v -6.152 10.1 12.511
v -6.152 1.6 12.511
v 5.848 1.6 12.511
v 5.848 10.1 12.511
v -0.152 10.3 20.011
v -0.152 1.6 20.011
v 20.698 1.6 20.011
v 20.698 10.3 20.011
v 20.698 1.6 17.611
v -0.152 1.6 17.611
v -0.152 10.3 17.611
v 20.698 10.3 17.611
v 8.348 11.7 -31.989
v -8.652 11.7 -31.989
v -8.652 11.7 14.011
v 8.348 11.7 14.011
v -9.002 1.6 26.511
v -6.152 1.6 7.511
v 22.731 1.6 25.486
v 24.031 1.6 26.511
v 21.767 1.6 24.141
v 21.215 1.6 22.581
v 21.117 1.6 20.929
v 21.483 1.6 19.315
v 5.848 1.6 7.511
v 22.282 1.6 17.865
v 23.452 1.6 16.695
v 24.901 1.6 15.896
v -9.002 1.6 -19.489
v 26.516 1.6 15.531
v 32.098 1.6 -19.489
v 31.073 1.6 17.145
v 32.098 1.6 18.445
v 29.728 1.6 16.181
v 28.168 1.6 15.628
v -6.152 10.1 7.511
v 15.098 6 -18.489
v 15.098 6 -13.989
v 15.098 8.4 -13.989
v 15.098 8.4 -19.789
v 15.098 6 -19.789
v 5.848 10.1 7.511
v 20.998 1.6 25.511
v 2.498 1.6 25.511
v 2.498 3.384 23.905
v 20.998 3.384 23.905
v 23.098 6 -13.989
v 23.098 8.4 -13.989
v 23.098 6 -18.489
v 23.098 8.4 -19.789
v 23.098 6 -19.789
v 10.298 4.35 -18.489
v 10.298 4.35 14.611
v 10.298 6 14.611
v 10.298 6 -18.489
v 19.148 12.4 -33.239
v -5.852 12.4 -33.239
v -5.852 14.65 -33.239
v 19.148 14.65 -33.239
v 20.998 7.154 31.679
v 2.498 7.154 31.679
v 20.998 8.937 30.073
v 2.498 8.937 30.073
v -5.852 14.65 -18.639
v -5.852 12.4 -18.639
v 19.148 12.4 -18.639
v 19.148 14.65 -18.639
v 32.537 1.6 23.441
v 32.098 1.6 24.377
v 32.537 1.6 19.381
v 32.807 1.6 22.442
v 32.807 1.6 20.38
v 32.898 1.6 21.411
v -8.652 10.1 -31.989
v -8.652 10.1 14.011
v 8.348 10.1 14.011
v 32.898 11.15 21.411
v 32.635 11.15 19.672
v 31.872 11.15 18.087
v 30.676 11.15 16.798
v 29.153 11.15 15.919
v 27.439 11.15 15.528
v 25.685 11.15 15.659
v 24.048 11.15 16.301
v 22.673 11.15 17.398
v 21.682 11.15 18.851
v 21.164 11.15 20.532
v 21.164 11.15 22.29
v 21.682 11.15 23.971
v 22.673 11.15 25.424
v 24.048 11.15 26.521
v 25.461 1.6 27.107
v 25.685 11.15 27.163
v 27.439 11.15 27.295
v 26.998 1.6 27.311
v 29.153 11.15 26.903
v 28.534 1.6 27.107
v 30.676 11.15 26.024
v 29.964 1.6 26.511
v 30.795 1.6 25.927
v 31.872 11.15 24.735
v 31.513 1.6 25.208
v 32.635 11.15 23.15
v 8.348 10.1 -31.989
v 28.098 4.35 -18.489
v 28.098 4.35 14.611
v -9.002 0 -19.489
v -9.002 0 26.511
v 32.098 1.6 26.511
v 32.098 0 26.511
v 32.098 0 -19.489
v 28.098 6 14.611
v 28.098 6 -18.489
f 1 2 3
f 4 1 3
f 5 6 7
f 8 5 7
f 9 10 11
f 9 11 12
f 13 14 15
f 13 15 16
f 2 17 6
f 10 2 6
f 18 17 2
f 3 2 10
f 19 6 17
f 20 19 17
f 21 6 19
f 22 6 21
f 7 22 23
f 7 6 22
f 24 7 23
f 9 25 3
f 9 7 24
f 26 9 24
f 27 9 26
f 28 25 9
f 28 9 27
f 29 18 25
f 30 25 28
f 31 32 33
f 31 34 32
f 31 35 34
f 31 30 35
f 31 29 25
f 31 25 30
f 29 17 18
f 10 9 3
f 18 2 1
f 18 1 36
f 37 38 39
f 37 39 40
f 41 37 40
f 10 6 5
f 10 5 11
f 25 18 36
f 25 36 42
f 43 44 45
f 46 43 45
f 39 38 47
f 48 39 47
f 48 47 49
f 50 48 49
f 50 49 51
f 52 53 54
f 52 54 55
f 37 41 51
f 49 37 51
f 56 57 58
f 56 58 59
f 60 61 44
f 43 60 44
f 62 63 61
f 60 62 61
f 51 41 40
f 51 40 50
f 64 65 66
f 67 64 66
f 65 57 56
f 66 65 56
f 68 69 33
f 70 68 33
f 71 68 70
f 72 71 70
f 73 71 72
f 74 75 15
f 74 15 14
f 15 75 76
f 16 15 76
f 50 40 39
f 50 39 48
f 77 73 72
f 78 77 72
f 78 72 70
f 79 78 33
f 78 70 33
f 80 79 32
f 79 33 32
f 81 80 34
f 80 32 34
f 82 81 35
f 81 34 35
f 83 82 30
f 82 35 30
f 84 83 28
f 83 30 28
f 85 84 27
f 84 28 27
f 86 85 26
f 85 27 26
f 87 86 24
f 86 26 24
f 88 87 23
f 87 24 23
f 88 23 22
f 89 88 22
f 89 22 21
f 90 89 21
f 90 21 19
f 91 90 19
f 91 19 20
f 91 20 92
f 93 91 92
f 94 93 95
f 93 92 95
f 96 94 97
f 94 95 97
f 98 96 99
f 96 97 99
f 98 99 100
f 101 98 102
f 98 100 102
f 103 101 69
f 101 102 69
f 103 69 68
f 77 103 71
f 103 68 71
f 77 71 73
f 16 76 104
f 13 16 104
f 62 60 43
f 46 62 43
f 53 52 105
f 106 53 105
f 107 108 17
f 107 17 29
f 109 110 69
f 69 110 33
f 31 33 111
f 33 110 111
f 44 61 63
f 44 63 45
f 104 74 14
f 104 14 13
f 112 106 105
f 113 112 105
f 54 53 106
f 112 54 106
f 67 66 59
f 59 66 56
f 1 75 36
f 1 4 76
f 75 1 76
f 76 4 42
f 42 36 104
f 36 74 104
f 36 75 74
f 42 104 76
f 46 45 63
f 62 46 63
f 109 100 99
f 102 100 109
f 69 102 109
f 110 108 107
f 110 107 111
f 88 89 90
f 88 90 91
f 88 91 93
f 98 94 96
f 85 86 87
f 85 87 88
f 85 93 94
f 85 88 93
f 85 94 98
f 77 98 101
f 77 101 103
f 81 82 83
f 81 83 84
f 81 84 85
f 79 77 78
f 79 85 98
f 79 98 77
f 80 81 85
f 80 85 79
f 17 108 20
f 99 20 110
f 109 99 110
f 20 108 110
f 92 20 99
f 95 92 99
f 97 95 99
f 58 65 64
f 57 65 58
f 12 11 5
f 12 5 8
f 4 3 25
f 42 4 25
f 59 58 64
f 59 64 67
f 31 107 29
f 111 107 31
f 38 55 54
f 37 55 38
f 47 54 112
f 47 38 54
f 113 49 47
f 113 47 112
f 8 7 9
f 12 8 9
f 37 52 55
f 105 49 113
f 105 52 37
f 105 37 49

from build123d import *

# Parameters (mm, degrees)
SKETCH1_W            = 41.1
SKETCH1_H            = 46
BOSS_EXTRUDE1_DEPTH  = 1.6
SKETCH2_R            = 5.9
BOSS_EXTRUDE2_DEPTH  = 9.55
BOSS_EXTRUDE3_START  = 2.75
SKETCH3_W            = 17.8
SKETCH3_H            = 33.1
BOSS_EXTRUDE3_DEPTH  = 1.65
SKETCH4_W            = 8
SKETCH4_H            = 5.8
BOSS_EXTRUDE4_DEPTH  = 2.4
SKETCH5_W            = 12
SKETCH5_H            = 5
BOSS_EXTRUDE5_DEPTH  = 8.5
SKETCH7_W            = 20.85
SKETCH7_H            = 2.4
BOSS_EXTRUDE7_DEPTH  = 8.7
BOSS_EXTRUDE8_START  = -11.5
BOSS_EXTRUDE8_DEPTH  = 18.5
SKETCH9_W            = 17
SKETCH9_H            = 46
BOSS_EXTRUDE10_DEPTH = 1.6
BOSS_EXTRUDE11_START = 0.7
SKETCH6_W            = 25
SKETCH6_H            = 14.6
BOSS_EXTRUDE11_DEPTH = 2.25


with BuildPart() as part:
    # Sketch1 → Boss-Extrude1 (new body)
    with BuildSketch(Plane(origin=(0, 0, 0), x_dir=(1, 0, 0), z_dir=(0, 1, 0))):
        with Locations((11.547619734, -3.511008705)):
            Rectangle(SKETCH1_W, SKETCH1_H)
    extrude(amount=BOSS_EXTRUDE1_DEPTH)

    # Sketch2 → Boss-Extrude2 (add)
    with BuildSketch(Plane(origin=(0, 1.6, 0), x_dir=(1, 0, 0), z_dir=(0, 1, 0))):
        with Locations((26.997619734, -21.411008705)):
            Circle(SKETCH2_R)
    extrude(amount=BOSS_EXTRUDE2_DEPTH)

    # Sketch5 → Boss-Extrude5 (add)
    with BuildSketch(Plane(origin=(0, 1.6, 0), x_dir=(1, 0, 0), z_dir=(0, 1, 0))):
        with Locations((-0.152380266, -10.011008705)):
            Rectangle(SKETCH5_W, SKETCH5_H)
    extrude(amount=BOSS_EXTRUDE5_DEPTH)

    # Sketch7 → Boss-Extrude7 (add)
    with BuildSketch(Plane(origin=(0, 1.6, 0), x_dir=(1, 0, 0), z_dir=(0, 1, 0))):
        with Locations((10.272619734, -18.811008705)):
            Rectangle(SKETCH7_W, SKETCH7_H)
    extrude(amount=BOSS_EXTRUDE7_DEPTH)

    # Sketch9 → Boss-Extrude10 (add)
    with BuildSketch(Plane(origin=(0, 10.1, 0), x_dir=(1, 0, 0), z_dir=(0, 1, 0))):
        with Locations((-0.152380266, 8.988991295)):
            Rectangle(SKETCH9_W, SKETCH9_H)
    extrude(amount=BOSS_EXTRUDE10_DEPTH)


with BuildPart() as body_2:
    # Sketch3 → Boss-Extrude3 (new body)
    with BuildSketch(Plane(origin=(0, 1.6, 0), x_dir=(1, 0, 0), z_dir=(0, 1, 0)).offset(BOSS_EXTRUDE3_START)):
        with Locations((19.197619734, 1.938991295)):
            Rectangle(SKETCH3_W, SKETCH3_H)
    extrude(amount=BOSS_EXTRUDE3_DEPTH)

    # Sketch4 → Boss-Extrude4 (add)
    with BuildSketch(Plane(origin=(0, 6, 0), x_dir=(1, 0, 0), z_dir=(0, 1, 0))):
        with Locations((19.097619734, 16.888991295)):
            Rectangle(SKETCH4_W, SKETCH4_H)
    extrude(amount=BOSS_EXTRUDE4_DEPTH)


with BuildPart() as body_3:
    # Sketch8 → Boss-Extrude8 (new body)
    with BuildSketch(Plane.ZY.offset(9.002380266).offset(BOSS_EXTRUDE8_START)):
        Polygon((23.905095249, 3.383547581), (30.073197301, 8.937331614), (31.679110756, 7.153784033), (25.511008705, 1.6), align=None)
    extrude(amount=-BOSS_EXTRUDE8_DEPTH)


with BuildPart() as body_4:
    # Sketch6 → Boss-Extrude11 (new body)
    with BuildSketch(Plane(origin=(0, 11.7, 0), x_dir=(1, 0, 0), z_dir=(0, 1, 0)).offset(BOSS_EXTRUDE11_START)):
        with Locations((6.647619734, 25.938991295)):
            Rectangle(SKETCH6_W, SKETCH6_H)
    extrude(amount=BOSS_EXTRUDE11_DEPTH)


solid = Compound([part.part, body_2.part, body_3.part, body_4.part])
